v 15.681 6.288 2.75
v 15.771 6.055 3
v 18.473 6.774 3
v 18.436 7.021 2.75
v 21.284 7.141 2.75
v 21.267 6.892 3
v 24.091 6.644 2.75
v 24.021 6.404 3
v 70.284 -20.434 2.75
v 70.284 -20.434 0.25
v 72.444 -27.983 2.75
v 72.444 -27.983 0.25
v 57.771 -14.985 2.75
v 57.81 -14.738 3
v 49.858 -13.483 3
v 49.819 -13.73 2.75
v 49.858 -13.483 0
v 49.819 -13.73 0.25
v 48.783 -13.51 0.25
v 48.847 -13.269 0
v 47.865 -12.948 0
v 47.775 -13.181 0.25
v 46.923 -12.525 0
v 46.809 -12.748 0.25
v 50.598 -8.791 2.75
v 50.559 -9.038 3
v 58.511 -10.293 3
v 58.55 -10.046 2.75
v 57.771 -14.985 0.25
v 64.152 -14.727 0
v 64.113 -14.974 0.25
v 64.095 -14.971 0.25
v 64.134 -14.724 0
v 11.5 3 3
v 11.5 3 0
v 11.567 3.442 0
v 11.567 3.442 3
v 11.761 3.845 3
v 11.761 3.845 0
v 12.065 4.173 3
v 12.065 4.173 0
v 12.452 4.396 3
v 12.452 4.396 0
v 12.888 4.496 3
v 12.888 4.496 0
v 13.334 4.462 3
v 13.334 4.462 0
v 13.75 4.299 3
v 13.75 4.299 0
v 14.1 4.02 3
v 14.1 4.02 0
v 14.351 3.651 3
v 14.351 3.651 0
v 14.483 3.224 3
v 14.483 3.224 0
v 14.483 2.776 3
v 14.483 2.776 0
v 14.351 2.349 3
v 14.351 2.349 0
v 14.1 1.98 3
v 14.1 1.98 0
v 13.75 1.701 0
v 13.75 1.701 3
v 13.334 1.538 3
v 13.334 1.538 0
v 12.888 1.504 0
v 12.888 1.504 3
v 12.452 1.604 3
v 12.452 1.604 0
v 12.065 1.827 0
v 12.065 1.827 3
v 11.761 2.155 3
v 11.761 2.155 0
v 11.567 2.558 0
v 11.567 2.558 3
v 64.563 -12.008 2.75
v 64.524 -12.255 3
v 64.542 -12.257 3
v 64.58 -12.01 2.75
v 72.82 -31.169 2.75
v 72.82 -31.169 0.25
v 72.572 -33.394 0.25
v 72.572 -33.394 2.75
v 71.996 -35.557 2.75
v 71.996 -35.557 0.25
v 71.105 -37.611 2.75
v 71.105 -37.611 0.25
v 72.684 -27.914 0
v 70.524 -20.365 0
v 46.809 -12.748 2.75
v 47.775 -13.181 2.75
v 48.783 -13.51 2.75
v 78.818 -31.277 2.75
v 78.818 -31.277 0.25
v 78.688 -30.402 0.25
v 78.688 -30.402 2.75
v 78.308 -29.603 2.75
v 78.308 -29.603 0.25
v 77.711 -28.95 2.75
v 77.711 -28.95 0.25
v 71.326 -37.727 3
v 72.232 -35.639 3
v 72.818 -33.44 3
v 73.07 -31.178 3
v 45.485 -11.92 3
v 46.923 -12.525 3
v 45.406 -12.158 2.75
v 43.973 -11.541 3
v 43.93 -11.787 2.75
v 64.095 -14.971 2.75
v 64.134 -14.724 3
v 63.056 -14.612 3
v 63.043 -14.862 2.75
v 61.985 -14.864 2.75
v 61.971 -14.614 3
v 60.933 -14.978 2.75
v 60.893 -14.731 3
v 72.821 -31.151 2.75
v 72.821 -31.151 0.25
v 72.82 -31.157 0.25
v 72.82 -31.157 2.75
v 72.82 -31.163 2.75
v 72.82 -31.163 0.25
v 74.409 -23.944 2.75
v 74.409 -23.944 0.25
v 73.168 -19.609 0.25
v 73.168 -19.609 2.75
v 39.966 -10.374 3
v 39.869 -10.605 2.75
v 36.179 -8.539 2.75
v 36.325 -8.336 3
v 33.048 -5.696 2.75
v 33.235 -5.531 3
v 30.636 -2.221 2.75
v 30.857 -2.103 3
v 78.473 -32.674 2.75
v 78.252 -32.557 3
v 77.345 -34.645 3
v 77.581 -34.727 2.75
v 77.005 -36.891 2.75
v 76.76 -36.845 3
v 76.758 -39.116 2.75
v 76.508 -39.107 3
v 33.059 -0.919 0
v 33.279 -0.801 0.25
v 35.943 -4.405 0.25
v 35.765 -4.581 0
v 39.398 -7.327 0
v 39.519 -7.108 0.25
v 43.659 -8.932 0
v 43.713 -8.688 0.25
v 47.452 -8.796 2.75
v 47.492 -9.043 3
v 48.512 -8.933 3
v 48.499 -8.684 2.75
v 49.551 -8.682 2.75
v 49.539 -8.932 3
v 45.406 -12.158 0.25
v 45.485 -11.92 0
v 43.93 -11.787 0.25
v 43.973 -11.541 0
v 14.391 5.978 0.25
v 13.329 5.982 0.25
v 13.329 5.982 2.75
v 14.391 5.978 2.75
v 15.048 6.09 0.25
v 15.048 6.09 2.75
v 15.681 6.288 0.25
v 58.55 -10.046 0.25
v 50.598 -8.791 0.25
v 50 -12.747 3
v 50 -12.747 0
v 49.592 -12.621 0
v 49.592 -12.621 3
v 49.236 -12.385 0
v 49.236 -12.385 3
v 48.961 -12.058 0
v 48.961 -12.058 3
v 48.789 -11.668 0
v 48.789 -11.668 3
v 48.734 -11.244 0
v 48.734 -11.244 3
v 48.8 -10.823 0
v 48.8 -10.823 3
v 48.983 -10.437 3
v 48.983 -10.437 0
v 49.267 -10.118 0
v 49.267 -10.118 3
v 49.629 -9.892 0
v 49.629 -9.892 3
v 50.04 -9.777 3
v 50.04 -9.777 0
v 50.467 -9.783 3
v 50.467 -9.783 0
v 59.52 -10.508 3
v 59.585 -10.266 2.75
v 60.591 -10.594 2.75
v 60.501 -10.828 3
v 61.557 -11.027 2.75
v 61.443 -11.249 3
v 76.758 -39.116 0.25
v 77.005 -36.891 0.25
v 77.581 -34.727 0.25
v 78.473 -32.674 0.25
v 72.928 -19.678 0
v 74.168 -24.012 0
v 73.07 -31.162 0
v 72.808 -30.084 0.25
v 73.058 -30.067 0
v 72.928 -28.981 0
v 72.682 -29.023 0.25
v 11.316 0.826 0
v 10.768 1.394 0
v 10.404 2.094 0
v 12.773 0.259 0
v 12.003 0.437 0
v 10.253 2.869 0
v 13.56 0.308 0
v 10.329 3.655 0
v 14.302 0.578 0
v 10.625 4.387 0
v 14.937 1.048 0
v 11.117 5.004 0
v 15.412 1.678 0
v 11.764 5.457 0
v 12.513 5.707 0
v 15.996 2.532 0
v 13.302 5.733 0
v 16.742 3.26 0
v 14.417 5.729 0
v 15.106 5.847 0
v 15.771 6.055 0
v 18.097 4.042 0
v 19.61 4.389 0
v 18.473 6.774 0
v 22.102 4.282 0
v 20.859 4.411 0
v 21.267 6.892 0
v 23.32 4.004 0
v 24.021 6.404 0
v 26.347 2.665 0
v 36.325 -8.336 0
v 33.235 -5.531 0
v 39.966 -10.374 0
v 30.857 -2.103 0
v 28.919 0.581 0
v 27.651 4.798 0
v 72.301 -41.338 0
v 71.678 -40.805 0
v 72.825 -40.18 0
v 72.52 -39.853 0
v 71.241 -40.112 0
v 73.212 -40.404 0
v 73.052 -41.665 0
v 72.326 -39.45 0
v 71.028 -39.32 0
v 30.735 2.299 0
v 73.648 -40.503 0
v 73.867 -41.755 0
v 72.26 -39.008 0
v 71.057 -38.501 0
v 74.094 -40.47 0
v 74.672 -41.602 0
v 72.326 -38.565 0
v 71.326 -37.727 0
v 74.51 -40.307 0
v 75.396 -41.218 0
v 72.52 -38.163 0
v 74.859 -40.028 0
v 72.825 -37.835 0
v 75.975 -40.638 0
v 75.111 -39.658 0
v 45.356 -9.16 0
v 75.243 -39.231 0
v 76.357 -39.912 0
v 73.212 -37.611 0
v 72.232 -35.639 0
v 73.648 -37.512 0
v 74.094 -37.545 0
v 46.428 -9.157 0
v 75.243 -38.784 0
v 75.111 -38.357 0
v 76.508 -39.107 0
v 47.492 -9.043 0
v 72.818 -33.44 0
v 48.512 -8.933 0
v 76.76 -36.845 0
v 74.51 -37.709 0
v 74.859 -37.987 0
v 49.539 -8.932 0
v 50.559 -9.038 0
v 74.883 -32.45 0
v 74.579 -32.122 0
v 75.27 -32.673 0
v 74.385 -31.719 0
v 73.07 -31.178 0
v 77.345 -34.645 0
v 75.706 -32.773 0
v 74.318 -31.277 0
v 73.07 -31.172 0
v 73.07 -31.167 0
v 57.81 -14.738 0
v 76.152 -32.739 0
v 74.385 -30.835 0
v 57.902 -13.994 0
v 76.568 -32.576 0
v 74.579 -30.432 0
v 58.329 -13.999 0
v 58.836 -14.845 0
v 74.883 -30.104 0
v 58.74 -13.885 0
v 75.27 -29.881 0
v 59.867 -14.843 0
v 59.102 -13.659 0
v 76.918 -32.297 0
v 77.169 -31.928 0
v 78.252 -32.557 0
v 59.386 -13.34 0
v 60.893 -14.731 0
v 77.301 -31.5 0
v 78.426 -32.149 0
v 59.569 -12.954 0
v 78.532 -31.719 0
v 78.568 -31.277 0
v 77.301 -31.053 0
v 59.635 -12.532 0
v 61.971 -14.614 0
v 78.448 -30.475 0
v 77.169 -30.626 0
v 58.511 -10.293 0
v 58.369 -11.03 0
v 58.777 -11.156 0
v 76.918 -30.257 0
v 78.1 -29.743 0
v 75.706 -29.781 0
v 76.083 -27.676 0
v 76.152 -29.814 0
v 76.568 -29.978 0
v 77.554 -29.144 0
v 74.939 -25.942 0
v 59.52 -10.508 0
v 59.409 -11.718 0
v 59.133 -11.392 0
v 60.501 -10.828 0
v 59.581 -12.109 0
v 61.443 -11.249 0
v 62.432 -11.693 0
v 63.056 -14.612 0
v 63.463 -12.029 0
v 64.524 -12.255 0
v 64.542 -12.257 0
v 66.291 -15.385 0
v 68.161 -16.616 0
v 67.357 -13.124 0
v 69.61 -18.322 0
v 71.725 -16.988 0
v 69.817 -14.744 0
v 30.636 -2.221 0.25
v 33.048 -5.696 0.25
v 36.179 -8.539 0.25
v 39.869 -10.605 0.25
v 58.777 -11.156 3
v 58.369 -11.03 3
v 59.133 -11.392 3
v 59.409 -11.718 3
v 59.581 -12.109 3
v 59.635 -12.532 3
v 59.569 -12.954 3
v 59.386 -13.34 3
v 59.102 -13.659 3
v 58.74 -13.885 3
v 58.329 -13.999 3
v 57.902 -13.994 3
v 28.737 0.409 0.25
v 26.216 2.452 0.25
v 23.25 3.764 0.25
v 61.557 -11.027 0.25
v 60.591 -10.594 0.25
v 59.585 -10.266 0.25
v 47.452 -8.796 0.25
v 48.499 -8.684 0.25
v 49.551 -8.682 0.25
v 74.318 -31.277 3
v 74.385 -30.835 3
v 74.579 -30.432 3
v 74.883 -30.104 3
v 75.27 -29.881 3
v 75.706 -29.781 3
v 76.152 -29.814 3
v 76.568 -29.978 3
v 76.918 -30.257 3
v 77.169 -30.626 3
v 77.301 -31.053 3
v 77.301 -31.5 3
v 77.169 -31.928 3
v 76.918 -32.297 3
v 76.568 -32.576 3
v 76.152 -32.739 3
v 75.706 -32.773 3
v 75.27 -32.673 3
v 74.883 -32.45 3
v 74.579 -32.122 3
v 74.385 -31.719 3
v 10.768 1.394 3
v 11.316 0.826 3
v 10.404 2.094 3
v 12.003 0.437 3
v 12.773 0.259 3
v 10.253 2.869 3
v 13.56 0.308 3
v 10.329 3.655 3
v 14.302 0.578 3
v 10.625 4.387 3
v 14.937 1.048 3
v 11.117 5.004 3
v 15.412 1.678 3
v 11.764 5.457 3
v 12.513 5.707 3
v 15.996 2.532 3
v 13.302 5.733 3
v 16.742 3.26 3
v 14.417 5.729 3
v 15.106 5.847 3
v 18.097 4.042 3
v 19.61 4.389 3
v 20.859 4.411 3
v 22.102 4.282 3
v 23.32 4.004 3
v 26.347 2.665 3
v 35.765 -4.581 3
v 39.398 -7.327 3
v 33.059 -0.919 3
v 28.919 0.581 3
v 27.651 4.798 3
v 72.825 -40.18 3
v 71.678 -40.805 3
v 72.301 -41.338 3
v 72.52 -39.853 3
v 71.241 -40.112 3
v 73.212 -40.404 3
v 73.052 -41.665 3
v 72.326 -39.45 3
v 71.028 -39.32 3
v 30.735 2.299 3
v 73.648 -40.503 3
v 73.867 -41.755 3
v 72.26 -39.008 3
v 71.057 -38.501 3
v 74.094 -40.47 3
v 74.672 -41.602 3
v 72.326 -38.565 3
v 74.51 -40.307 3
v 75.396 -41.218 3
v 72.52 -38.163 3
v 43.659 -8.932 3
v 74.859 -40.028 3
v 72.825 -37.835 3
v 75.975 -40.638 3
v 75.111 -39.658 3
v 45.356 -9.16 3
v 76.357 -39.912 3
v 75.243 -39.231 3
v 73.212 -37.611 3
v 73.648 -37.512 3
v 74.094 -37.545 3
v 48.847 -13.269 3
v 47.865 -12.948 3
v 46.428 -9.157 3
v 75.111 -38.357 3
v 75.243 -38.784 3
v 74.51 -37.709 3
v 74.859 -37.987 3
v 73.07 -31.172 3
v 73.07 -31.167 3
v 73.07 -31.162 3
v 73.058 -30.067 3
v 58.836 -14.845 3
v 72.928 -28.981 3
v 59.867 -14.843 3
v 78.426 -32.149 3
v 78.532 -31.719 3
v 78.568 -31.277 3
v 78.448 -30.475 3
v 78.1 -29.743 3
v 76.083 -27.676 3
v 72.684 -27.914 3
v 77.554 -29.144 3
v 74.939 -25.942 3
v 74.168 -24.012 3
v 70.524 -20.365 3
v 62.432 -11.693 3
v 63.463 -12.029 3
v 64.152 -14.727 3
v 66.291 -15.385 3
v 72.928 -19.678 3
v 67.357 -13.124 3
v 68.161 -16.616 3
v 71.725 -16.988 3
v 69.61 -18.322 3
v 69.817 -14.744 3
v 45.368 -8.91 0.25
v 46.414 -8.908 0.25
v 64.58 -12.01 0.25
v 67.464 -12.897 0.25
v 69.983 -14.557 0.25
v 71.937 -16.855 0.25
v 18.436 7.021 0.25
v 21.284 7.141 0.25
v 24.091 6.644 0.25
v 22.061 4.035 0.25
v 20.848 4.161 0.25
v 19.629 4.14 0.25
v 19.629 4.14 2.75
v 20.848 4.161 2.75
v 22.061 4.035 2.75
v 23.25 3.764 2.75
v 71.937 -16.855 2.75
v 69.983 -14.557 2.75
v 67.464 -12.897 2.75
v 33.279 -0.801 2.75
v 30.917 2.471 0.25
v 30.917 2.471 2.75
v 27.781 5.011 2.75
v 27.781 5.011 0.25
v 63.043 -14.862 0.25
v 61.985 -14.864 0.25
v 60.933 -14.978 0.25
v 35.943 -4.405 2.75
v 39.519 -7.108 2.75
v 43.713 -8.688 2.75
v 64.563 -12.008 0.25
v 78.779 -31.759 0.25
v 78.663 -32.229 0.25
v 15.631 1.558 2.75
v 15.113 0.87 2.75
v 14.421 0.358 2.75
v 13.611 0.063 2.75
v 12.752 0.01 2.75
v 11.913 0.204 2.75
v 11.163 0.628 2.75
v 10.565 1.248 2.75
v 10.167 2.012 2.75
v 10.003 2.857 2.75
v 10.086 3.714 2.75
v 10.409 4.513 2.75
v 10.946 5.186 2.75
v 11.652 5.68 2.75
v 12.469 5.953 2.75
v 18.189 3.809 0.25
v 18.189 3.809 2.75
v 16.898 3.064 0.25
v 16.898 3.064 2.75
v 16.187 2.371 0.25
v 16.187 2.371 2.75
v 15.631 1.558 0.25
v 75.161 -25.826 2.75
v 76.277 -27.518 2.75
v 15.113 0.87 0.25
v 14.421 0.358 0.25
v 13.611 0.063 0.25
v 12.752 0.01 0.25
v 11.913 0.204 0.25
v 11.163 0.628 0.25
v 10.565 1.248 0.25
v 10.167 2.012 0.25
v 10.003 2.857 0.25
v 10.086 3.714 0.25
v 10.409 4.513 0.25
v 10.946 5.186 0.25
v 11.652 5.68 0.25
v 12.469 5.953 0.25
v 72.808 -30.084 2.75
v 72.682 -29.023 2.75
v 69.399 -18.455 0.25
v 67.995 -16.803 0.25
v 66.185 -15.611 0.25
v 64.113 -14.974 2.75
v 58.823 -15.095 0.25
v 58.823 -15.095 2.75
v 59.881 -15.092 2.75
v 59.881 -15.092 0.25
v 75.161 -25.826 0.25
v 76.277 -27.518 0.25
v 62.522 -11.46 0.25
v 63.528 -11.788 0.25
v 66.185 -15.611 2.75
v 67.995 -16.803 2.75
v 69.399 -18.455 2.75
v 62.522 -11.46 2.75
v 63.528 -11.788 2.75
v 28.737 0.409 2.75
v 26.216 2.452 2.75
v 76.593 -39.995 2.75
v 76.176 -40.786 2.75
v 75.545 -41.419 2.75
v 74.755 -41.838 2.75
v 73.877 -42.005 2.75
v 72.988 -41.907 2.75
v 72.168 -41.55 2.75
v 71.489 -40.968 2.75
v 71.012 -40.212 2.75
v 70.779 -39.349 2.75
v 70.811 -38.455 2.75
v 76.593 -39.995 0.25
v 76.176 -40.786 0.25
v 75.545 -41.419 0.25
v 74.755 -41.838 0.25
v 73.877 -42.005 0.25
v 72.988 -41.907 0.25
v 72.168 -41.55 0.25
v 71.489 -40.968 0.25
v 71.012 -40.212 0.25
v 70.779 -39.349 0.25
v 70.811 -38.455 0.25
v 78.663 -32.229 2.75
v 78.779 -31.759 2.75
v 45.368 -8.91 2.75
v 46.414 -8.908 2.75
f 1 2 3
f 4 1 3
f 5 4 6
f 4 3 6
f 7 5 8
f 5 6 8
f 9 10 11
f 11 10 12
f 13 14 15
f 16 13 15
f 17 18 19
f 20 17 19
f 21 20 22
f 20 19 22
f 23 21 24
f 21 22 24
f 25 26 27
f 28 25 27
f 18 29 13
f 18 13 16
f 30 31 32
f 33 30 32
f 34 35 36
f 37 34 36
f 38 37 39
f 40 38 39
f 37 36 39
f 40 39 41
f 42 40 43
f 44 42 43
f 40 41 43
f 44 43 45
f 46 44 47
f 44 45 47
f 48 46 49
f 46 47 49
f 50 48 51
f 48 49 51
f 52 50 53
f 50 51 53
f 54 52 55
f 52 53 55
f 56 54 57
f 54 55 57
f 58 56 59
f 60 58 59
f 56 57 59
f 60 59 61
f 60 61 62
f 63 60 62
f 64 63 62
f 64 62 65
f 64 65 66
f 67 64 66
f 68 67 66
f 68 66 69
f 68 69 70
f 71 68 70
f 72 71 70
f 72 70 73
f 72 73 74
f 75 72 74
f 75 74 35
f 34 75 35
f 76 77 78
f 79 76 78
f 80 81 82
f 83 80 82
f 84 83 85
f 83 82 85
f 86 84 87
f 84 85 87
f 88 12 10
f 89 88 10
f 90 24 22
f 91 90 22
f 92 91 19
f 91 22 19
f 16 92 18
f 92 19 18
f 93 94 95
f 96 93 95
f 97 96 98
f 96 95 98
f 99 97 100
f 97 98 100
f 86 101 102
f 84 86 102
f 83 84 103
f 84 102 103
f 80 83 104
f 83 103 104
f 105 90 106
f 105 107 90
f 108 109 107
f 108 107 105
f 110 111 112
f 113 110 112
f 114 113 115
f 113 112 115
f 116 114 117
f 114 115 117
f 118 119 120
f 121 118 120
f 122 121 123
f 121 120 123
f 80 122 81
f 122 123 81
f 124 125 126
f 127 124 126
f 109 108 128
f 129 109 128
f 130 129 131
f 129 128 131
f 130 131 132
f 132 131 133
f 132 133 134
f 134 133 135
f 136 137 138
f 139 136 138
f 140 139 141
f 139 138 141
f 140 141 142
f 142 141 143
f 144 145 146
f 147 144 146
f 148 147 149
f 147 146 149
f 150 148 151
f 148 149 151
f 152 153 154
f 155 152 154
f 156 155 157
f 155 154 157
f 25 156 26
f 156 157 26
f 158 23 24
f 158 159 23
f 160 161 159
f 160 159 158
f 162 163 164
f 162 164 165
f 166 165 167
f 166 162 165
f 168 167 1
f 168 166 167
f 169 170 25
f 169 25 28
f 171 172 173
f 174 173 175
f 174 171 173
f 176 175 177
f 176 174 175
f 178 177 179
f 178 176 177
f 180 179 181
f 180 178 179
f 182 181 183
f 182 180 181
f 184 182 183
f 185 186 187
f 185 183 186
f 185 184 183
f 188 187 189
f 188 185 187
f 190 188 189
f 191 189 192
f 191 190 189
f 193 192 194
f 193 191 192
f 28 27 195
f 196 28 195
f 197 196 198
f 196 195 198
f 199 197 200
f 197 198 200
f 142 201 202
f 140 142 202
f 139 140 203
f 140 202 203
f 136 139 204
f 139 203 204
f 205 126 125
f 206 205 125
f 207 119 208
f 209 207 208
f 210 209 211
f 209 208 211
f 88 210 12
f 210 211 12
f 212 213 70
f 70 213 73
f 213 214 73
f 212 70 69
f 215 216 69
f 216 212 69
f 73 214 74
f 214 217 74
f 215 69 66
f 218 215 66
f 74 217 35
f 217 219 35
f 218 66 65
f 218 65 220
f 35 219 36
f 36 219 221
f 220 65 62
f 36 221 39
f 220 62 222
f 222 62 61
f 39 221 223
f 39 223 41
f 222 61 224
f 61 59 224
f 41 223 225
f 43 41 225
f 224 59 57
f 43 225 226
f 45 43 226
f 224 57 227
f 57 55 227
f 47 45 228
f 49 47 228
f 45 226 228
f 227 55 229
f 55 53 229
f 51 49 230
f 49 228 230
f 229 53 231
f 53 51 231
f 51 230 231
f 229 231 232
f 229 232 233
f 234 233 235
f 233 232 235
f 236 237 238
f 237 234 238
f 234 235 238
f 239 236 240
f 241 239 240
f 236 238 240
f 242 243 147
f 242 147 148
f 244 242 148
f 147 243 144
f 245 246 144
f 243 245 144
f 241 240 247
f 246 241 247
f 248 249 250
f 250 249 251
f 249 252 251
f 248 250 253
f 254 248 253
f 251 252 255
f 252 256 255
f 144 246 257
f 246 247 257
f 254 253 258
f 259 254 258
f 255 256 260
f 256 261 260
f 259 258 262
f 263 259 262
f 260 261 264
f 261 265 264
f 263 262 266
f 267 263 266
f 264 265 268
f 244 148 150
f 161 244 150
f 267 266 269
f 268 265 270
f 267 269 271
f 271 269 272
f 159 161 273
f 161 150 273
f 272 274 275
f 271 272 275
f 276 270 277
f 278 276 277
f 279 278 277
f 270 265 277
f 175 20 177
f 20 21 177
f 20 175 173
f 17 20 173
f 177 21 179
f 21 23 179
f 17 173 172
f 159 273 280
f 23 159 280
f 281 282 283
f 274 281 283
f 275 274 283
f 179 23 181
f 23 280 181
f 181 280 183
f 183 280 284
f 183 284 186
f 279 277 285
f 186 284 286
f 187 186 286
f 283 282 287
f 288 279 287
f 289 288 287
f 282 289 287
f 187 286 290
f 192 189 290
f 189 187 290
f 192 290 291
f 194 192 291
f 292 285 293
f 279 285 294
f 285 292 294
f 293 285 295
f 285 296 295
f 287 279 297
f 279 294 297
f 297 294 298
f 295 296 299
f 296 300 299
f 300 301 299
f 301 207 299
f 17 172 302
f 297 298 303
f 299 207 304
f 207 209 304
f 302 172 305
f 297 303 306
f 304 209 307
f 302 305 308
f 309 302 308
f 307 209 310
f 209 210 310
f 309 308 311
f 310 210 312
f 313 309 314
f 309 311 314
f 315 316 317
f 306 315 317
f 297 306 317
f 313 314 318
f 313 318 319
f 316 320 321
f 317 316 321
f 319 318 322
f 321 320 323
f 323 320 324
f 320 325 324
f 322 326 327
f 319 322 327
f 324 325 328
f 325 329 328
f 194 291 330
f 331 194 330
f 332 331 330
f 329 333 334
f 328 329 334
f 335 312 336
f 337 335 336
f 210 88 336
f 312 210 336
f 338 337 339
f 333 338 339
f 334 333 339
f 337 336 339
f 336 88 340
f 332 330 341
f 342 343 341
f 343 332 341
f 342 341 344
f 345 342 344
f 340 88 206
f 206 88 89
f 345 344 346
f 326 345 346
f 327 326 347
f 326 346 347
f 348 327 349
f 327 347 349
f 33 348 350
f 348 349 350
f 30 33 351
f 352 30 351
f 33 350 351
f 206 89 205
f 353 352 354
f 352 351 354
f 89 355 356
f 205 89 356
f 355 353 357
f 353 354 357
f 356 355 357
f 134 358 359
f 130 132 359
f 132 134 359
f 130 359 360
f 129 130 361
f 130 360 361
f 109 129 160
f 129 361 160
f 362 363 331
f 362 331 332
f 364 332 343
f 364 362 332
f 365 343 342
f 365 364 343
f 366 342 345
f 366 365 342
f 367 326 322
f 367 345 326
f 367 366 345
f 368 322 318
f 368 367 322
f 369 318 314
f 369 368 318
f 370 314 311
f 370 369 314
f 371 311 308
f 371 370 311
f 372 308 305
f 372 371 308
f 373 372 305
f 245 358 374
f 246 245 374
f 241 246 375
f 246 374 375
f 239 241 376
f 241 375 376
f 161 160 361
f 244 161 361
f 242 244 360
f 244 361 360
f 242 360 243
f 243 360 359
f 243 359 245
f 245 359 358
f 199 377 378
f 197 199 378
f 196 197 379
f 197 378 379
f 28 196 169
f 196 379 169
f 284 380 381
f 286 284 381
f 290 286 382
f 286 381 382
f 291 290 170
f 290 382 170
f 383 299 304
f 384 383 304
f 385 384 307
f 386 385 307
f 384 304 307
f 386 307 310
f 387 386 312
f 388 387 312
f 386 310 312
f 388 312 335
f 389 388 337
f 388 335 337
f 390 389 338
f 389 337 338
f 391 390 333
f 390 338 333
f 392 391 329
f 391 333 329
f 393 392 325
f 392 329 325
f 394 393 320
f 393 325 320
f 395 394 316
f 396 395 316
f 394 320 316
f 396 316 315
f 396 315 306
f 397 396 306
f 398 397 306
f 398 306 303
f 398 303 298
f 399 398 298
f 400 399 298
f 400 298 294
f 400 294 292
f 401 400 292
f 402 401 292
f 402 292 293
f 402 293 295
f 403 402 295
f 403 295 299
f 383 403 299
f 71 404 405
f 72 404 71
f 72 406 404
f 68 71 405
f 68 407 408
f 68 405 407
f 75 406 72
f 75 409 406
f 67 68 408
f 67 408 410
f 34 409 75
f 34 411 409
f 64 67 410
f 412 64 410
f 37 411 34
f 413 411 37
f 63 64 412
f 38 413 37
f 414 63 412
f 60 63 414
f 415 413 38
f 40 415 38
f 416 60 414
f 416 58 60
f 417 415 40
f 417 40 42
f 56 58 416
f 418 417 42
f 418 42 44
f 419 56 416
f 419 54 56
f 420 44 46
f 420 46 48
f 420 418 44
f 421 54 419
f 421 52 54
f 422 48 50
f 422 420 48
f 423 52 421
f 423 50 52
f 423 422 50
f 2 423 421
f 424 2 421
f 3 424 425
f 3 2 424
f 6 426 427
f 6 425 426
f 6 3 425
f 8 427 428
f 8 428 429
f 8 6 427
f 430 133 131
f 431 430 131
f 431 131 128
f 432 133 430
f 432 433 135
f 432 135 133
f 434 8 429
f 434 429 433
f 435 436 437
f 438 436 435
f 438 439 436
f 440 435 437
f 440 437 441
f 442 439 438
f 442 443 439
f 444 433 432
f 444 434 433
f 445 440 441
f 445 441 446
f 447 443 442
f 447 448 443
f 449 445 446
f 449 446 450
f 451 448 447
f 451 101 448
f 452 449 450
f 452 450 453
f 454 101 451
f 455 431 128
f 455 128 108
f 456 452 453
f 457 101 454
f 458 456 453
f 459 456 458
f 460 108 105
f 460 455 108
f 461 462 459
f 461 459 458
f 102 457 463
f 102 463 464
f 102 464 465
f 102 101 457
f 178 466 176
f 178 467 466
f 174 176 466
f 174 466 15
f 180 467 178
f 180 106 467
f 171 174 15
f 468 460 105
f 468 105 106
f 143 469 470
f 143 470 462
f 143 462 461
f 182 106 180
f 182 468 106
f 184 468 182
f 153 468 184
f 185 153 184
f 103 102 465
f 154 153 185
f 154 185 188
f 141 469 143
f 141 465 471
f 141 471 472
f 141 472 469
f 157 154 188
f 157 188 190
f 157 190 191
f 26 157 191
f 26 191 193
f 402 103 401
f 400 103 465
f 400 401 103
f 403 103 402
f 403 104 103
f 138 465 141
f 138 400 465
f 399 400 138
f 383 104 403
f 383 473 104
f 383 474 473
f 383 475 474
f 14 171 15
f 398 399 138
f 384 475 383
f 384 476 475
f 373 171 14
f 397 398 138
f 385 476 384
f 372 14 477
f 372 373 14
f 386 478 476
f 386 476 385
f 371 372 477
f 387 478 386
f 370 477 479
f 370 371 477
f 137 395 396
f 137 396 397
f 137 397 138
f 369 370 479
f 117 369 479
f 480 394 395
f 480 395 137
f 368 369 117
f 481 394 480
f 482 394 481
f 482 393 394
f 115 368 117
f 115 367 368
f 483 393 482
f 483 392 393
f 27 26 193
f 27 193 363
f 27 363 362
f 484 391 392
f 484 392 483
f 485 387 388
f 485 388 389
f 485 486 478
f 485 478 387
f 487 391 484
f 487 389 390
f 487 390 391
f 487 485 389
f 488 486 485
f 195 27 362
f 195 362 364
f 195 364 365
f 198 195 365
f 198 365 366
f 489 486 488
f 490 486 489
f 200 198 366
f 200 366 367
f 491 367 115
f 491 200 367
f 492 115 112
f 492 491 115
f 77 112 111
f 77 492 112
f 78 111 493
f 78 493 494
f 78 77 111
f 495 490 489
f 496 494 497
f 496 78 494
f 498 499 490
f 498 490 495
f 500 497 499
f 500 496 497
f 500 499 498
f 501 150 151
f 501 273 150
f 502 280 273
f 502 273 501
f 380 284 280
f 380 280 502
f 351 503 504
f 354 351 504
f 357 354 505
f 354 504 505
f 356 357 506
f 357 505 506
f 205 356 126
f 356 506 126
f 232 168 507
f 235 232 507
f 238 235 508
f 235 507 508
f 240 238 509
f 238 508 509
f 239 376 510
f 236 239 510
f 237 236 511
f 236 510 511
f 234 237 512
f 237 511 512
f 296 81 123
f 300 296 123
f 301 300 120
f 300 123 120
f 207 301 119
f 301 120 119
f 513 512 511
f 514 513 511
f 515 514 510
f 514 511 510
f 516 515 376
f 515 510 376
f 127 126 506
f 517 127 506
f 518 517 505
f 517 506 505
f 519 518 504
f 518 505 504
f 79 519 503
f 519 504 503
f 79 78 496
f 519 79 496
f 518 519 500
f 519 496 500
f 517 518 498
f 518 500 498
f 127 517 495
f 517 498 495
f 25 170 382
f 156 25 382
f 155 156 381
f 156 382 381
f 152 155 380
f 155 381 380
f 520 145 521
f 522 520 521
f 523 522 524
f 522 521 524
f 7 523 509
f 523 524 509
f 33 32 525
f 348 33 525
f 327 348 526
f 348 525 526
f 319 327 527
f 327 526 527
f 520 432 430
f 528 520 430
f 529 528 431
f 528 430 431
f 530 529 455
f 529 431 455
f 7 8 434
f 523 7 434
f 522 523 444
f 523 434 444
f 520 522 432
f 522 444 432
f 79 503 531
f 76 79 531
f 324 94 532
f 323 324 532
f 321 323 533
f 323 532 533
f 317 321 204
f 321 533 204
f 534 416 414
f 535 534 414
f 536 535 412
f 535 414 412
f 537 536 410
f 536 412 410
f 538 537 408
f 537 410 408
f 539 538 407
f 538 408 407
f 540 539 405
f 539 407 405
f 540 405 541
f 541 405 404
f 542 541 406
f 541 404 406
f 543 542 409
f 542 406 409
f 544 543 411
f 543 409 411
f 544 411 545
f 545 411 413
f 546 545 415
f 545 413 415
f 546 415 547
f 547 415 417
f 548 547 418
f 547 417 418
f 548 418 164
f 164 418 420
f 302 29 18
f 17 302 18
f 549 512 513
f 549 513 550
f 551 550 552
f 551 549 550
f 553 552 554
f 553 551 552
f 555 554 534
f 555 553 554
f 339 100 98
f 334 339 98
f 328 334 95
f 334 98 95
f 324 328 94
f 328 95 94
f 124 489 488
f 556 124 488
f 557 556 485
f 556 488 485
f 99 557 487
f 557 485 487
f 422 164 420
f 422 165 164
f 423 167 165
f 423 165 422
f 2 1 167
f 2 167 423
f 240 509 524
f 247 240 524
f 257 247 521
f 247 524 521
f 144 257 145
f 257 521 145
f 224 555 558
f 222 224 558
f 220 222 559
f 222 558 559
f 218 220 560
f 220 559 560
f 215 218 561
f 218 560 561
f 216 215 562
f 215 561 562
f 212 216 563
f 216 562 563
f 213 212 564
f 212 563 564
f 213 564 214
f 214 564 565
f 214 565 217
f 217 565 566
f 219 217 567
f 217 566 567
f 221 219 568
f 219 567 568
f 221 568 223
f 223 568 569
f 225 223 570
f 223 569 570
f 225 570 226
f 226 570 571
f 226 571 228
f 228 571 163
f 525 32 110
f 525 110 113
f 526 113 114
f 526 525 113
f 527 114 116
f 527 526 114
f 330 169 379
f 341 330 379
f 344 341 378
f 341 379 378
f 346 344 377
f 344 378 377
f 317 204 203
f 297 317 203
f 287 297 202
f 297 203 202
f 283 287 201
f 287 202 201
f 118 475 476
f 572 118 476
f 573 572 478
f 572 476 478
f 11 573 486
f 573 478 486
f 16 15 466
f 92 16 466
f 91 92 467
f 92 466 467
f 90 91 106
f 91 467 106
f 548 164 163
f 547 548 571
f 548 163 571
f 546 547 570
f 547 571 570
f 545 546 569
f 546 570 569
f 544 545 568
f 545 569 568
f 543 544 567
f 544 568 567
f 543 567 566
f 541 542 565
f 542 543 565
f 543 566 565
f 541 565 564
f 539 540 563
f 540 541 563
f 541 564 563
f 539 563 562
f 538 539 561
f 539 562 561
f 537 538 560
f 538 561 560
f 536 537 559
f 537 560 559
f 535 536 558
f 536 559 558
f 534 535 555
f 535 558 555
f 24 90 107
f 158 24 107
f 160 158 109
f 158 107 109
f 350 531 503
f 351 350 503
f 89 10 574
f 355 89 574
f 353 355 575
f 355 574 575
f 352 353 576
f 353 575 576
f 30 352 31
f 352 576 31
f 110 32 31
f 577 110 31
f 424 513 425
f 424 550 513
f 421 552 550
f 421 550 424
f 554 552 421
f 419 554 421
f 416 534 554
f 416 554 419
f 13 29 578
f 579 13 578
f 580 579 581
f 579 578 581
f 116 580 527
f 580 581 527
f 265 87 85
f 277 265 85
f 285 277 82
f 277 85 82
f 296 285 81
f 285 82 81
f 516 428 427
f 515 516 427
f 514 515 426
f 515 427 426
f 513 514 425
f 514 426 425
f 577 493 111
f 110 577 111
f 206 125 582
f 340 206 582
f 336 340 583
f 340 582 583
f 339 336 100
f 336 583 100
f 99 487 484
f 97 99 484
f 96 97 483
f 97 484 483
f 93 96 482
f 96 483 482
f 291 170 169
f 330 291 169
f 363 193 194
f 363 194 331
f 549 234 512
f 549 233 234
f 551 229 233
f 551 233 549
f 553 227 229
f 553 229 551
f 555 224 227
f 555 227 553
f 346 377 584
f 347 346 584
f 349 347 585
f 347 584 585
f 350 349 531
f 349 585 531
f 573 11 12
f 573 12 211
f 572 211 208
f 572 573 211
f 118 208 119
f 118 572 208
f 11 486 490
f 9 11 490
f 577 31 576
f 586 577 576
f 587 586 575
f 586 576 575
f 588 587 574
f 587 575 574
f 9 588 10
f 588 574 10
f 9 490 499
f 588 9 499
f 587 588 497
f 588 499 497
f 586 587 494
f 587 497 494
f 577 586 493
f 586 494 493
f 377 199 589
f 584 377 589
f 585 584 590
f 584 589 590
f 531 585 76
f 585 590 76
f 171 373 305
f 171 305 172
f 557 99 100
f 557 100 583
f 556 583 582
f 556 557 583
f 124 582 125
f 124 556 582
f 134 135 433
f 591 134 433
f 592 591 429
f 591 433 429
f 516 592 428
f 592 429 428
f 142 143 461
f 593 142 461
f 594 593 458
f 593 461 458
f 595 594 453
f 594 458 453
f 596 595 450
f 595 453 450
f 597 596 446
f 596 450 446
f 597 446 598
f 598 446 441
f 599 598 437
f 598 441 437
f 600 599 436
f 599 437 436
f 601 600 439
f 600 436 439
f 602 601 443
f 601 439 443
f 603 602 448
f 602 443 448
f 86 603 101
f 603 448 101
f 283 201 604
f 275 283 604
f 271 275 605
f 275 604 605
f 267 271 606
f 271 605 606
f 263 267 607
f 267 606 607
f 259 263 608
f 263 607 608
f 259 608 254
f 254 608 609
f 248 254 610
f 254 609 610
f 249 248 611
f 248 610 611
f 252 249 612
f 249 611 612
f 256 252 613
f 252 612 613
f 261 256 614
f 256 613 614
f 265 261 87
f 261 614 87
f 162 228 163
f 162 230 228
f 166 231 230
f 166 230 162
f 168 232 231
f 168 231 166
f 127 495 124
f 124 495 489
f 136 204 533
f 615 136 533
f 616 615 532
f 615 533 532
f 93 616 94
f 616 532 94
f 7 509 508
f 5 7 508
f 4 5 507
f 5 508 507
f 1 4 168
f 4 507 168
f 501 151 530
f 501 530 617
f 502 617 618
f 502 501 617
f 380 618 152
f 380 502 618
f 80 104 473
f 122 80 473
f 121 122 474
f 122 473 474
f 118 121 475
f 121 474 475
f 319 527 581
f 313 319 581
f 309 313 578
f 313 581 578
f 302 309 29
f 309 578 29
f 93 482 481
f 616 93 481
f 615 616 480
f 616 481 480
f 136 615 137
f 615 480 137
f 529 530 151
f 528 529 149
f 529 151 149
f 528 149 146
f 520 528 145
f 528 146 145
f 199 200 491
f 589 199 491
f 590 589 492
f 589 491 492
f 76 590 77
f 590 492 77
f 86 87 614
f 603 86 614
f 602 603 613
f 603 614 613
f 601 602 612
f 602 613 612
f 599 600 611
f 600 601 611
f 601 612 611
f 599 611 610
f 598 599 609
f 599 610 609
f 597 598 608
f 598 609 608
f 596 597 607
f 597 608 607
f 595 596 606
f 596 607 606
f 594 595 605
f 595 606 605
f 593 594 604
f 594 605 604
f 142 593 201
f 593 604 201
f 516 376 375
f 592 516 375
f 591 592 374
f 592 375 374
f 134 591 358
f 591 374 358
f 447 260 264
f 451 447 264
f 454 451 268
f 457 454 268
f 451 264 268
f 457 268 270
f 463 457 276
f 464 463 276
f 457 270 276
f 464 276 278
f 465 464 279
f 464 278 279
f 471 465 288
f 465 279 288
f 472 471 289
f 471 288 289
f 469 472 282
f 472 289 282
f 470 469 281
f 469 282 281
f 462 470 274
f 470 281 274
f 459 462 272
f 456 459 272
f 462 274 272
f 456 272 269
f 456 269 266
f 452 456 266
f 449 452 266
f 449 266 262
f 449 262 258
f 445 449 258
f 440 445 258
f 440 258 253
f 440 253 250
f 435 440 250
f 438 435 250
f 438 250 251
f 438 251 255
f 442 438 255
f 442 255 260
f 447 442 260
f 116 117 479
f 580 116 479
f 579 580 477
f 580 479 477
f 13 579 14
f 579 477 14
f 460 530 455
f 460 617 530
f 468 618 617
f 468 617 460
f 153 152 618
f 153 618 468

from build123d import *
from OCP.BRepFilletAPI import BRepFilletAPI_MakeFillet

# Parameters (mm, degrees)
EXTRUDE_THIN1_DEPTH     = 3
SKETCH1_6_R             = 3
BOSS_EXTRUDE2_DEPTH     = 3
FILLET1_R               = 10
FILLET2_R               = 10
FILLET3_R1              = 10
FILLET3_R2              = 5
CHAMFER1_SIZE           = 0.25
CUT_EXTRUDE1_DEPTH      = 90.36389433
F_3_0_MM_DOWEL_HOLES1_D = 3


with BuildPart() as part:
    # Sketch1 → Extrude-Thin1 (new body)
    with BuildSketch(Plane.XY):
        with BuildLine():
            ThreePointArc((13.956778483, 1.844761957), (18.364214045, 3.961300509), (23.249537827, 3.764233943))
            ThreePointArc((23.249537827, 3.764233943), (27.544341573, 1.513827454), (30.636293504, -2.221075738))
            ThreePointArc((30.636293504, -2.221075738), (36.280115015, -8.611383188), (44.176022564, -11.827498007))
            Line((44.176022564, -11.827498007), (64.112853909, -14.973721748))
            ThreePointArc((64.112853909, -14.973721748), (67.995089498, -16.803438115), (70.284091708, -20.433876661))
            Line((70.284091708, -20.433876661), (73.760858733, -32.587064718))
            Line((73.760858733, -32.587064718), (76.645152845, -31.761929896))
            Line((76.645152845, -31.761929896), (73.168385821, -19.60874184))
            ThreePointArc((73.168385821, -19.60874184), (69.983011914, -14.556626047), (64.580495529, -12.010394005))
            Line((64.580495529, -12.010394005), (44.643664184, -8.864170263))
            ThreePointArc((44.643664184, -8.864170263), (38.016065461, -6.164655567), (33.278803277, -0.80081446))
            ThreePointArc((33.278803277, -0.80081446), (29.432995007, 3.844704587), (24.091064686, 6.64378817))
            ThreePointArc((24.091064686, 6.64378817), (17.757357703, 6.899280322), (12.043221517, 4.155238043))
            Line((12.043221517, 4.155238043), (13.956778483, 1.844761957))
        make_face()
    extrude(amount=EXTRUDE_THIN1_DEPTH)

    # Sketch1<6> → Boss-Extrude2 (add)
    with BuildSketch(Plane.XY):
        with BuildLine():
            ThreePointArc((78.472958706, -32.673622319), (75.046124973, -34.175890794), (72.819900547, -31.168578904))
            ThreePointArc((72.819900547, -31.168578904), (72.324756821, -34.48620054), (71.104744395, -37.610836569))
            ThreePointArc((71.104744395, -37.610836569), (74.47911855, -36.0951074), (76.759757859, -39.007584043))
            ThreePointArc((76.759757859, -39.007584043), (76.759268993, -39.061740839), (76.757802553, -39.115879984))
            ThreePointArc((76.757802553, -39.115879984), (77.252946279, -35.798258348), (78.472958706, -32.673622319))
        make_face()
        with BuildLine():
            ThreePointArc((78.817945242, -31.276874845), (77.878853444, -29.096815814), (75.649506987, -28.281607152))
            Line((75.649506987, -28.281607152), (76.645152845, -31.761929896))
            Line((76.645152845, -31.761929896), (75.203005789, -32.174497307))
            Line((75.203005789, -32.174497307), (73.760858733, -32.587064718))
            Line((73.760858733, -32.587064718), (73.053014062, -30.112763351))
            ThreePointArc((73.053014062, -30.112763351), (72.888498306, -30.63008226), (72.819900547, -31.168578904))
            ThreePointArc((72.819900547, -31.168578904), (75.046124973, -34.175890794), (78.472958706, -32.673622319))
            ThreePointArc((78.472958706, -32.673622319), (78.730421885, -31.996235537), (78.817945242, -31.276874845))
        make_face()
        with Locations((73.759757859, -39.007584043)):
            Circle(SKETCH1_6_R)
        with Locations((13, 3)):
            Circle(SKETCH1_6_R)
        Polygon((46.29255307, -8.112005426), (62.855890569, -10.725859392), (62.07648787, -15.664738964), (45.51315037, -13.050884998), align=None)
    extrude(amount=BOSS_EXTRUDE2_DEPTH)

    # Fillet1
    # the kernel refuses this fillet: 10 mm, written as the material it takes off along each edge
    with BuildSketch(Plane(origin=(45.51315037, -13.050884998, -10.897247359), x_dir=(0.9877759145103069, -0.1558805398801499, 0), z_dir=(0, 0, 1)), Plane(origin=(62.855890569, -10.725859392, -10.897247359), x_dir=(-0.9877759145103069, 0.15588053988014952, 0), z_dir=(0, 0, 1))) as fillet1_piece_1:
        with BuildLine():
            CenterArc((4.358898944, 10), FILLET1_R, 244.158067237, 25.841932763)
            Line((0, 1), (-0.087177979, 0.82))
            ThreePointArc((-0.087177979, 0.82), (-0.2, 0.5), (-0.2, 0))
            Line((-0.2, 0), (0, -0.2))
            Line((0, -0.2), (4.358898944, -0.2))
            Line((4.358898944, -0.2), (4.358898944, 0))
        make_face()
    extrude(amount=24.794494718, mode=Mode.SUBTRACT)
    with BuildSketch(Plane(origin=(62.07648787, -15.664738964, -10.897247359), x_dir=(0.1558805398801516, 0.9877759145103067, 0), z_dir=(0, 0, 1)), Plane(origin=(46.29255307, -8.112005426, -10.897247359), x_dir=(-0.1558805398801516, -0.9877759145103067, 0), z_dir=(0, 0, 1))) as fillet1_piece_2:
        with BuildLine():
            CenterArc((10, 4.358898944), FILLET1_R, 180, 25.841932763)
            Line((0, 4.358898944), (-0.2, 4.358898944))
            Line((-0.2, 4.358898944), (-0.2, 0))
            Line((-0.2, 0), (0, -0.2))
            ThreePointArc((0, -0.2), (0.5, -0.2), (0.82, -0.087177979))
            Line((0.82, -0.087177979), (1, 0))
        make_face()
    extrude(amount=24.794494718, mode=Mode.SUBTRACT)

    # Fillet2
    fillet2_edges = [part.edges().sort_by_distance(p)[0] for p in [
        (62.23236841, -14.67696305, 1.5),
        (62.70001003, -11.713635306, 1.5),
        (45.66903091, -12.063109084, 1.5),
        (46.13667253, -9.09978134, 1.5),
    ]]
    fillet(fillet2_edges, radius=FILLET2_R)

    # Fillet3: one fillet with a radius per group of edges: ONE call of the kernel's fillet builder (fillet() takes one radius for all edges)
    fillet3_edges_1 = [part.edges().sort_by_distance(p)[0] for p in [
        (73.053014062, -30.112763351, 1.5),
        (75.649506987, -28.281607152, 1.5),
    ]]
    fillet3_edges_2 = [part.edges().sort_by_distance(p)[0] for p in [
        (14.342872483, 5.682665371, 1.5),
        (15.99591873, 3.156431979, 1.5),
    ]]
    fillet3 = BRepFilletAPI_MakeFillet(part.part.solid().wrapped)
    for e in fillet3_edges_1:
        fillet3.Add(FILLET3_R1, e.wrapped)
    for e in fillet3_edges_2:
        fillet3.Add(FILLET3_R2, e.wrapped)
    add(Compound.cast(fillet3.Shape()), mode=Mode.REPLACE)

    # Chamfer1
    chamfer1_edges = [part.edges().sort_by_distance(p)[0] for p in [
        (54.57422182, -9.418932409, 0),
        (60.092477637, -10.417114134, 0),
        (48.27462413, -13.358997517, 0),
        (54.57422182, -9.418932409, 3),
        (49.025073316, -8.669242301, 3),
        (59.352291729, -15.107486729, 3),
        (29.432995007, 3.844704587, 0),
        (48.27462413, -13.358997517, 3),
        (64.571774389, -12.009017725, 0),
        (36.178802299, -8.53899299, 0),
        (36.178802299, -8.53899299, 3),
        (37.633792223, -5.884652293, 0),
        (37.633792223, -5.884652293, 3),
        (21.456361373, 4.116360797, 3),
        (69.983011914, -14.556626047, 0),
        (49.025073316, -8.669242301, 0),
        (59.352291729, -15.107486729, 0),
        (60.092477637, -10.417114134, 3),
        (45.406180886, -12.157630236, 0),
        (45.406180886, -12.157630236, 3),
        (45.57735687, -8.918557885, 0),
        (45.57735687, -8.918557885, 3),
        (62.513992379, -14.848753903, 0),
        (67.995089498, -16.803438115, 0),
        (62.513992379, -14.848753903, 3),
        (63.02085079, -11.636919182, 0),
        (63.02085079, -11.636919182, 3),
        (64.104132769, -14.972345468, 0),
        (27.544341573, 1.513827454, 0),
        (21.456361373, 4.116360797, 0),
        (10.338658069, 1.615348734, 3),
        (19.856644471, 7.158769061, 0),
        (10.338658069, 1.615348734, 0),
        (73.788452871, -21.776212775, 0),
        (73.788452871, -21.776212775, 3),
        (71.36386404, -24.208267097, 0),
        (71.36386404, -24.208267097, 3),
        (72.820223354, -31.159983943, 0),
        (72.820223354, -31.159983943, 3),
        (17.30302071, 3.35546819, 0),
        (27.544341573, 1.513827454, 3),
        (17.30302071, 3.35546819, 3),
        (14.523458256, 5.993511964, 0),
        (14.523458256, 5.993511964, 3),
        (75.675797588, -26.700228887, 3),
        (75.675797588, -26.700228887, 0),
        (72.759314108, -29.551891496, 3),
        (72.759314108, -29.551891496, 0),
        (64.104132769, -14.972345468, 3),
        (67.995089498, -16.803438115, 3),
        (78.757105023, -30.675759401, 0),
        (77.252946279, -35.798258348, 0),
        (72.324756821, -34.48620054, 0),
        (72.987937591, -41.906599992, 0),
        (72.324756821, -34.48620054, 3),
        (72.987937591, -41.906599992, 3),
        (77.252946279, -35.798258348, 3),
        (78.757105023, -30.675759401, 3),
        (69.983011914, -14.556626047, 3),
        (64.571774389, -12.009017725, 3),
        (19.856644471, 7.158769061, 3),
        (29.432995007, 3.844704587, 3),
        (53.79481912, -14.357811981, 0),
        (53.79481912, -14.357811981, 3),
    ]]
    chamfer(chamfer1_edges, length=CHAMFER1_SIZE)

    # Sketch2 → Cut-Extrude1 (cut, through all)
    with BuildSketch(Plane.XY.offset(3)):
        with BuildLine():
            Line((50.467237622, -9.783186164), (58.369444938, -11.030230483))
            ThreePointArc((58.369444938, -11.030230483), (59.617288, -12.745715164), (57.901803318, -13.993558226))
            Line((57.901803318, -13.993558226), (49.999596002, -12.746513907))
            ThreePointArc((49.999596002, -12.746513907), (48.75175294, -11.031029225), (50.467237622, -9.783186164))
        make_face()
    extrude(amount=-CUT_EXTRUDE1_DEPTH, mode=Mode.SUBTRACT)

    # Ø3.0 mm Dowel Holes1 (through all)
    with Locations(Plane.XY.offset(3)):
        with Locations((13, 3), (75.817945242, -31.276874845), (73.759757859, -39.007584043)):
            Hole(F_3_0_MM_DOWEL_HOLES1_D / 2)


solid = part.part
